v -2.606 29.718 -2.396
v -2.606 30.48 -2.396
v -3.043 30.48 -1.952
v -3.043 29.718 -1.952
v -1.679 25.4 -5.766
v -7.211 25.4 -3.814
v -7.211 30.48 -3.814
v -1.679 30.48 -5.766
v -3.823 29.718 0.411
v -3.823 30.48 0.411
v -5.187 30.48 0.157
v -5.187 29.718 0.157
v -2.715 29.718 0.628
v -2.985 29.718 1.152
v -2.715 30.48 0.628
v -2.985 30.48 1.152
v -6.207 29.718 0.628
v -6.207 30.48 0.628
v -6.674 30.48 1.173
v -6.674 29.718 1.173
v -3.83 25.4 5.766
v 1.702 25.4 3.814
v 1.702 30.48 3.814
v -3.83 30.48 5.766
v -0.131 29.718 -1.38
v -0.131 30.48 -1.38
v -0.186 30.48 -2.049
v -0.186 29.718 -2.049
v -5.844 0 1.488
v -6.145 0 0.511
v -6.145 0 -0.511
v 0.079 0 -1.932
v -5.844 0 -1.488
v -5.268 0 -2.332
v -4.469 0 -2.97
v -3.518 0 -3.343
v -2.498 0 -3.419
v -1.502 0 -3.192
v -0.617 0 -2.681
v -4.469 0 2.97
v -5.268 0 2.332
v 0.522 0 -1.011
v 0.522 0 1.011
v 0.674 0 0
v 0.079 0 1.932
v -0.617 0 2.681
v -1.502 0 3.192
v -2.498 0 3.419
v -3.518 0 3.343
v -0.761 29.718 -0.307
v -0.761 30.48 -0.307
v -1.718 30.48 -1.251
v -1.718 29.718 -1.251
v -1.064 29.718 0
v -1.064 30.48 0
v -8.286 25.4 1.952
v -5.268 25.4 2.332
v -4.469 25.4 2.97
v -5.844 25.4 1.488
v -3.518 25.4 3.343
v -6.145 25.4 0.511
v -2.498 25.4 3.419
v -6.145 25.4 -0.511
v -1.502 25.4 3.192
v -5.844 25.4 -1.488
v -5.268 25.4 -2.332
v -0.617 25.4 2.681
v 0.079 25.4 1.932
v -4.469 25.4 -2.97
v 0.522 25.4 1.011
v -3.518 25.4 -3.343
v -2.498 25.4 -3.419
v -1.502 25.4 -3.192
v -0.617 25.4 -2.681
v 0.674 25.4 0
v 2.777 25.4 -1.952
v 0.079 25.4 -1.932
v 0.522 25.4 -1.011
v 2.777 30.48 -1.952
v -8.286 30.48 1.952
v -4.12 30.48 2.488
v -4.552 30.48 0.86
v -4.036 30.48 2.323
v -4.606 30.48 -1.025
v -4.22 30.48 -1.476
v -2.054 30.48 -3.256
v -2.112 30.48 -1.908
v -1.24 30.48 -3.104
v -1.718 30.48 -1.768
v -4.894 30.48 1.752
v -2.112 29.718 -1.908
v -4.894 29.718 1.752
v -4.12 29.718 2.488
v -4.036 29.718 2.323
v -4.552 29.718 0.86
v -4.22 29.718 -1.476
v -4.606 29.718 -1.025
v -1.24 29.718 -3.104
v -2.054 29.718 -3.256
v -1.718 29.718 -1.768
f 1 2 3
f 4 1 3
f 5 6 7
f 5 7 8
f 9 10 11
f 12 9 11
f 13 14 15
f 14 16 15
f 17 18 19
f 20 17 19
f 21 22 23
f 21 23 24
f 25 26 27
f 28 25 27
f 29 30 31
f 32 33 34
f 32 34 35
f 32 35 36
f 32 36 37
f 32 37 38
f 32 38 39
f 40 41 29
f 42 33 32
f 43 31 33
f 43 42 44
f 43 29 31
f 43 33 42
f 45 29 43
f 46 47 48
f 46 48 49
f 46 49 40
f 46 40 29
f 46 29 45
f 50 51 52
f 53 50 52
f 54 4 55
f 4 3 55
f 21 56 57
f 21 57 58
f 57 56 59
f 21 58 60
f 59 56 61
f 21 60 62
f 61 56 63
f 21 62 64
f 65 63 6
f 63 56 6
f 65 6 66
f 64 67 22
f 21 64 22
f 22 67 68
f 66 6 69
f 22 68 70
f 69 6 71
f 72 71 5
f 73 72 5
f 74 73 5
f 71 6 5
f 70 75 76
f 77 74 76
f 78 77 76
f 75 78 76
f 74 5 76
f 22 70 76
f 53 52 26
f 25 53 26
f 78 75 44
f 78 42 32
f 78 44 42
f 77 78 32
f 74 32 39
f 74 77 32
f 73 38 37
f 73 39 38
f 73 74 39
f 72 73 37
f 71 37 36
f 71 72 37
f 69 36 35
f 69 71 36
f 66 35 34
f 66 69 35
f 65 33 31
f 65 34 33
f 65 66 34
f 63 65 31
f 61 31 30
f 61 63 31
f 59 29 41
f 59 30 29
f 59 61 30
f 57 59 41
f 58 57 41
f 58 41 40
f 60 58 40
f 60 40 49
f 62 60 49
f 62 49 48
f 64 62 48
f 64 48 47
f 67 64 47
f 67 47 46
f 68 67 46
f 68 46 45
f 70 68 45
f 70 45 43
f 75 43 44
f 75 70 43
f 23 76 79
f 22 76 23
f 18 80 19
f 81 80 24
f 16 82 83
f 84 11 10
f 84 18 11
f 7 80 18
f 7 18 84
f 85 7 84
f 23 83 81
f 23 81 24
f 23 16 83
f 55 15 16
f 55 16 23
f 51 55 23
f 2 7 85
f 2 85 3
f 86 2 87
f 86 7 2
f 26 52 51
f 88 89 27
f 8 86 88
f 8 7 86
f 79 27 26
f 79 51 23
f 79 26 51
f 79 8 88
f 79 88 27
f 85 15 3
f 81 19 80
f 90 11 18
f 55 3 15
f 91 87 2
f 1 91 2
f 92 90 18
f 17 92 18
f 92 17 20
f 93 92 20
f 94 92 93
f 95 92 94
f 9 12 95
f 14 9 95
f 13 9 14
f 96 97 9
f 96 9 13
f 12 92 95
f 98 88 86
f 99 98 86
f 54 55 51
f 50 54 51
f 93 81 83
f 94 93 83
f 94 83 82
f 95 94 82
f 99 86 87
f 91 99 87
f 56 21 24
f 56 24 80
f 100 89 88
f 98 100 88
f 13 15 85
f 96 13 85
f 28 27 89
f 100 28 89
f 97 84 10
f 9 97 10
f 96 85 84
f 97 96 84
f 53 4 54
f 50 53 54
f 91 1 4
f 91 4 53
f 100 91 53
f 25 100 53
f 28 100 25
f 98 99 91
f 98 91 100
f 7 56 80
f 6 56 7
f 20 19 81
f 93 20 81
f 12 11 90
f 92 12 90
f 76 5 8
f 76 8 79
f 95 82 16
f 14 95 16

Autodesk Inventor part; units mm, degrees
ref_plane "YZ Plane" through (0, 0, 0) normal (1, 0, 0) x (0, 1, 0)
ref_plane "XZ Plane" through (0, 0, 0) normal (0, 1, 0) x (-1, 0, 0)
ref_plane "XY Plane" through (0, 0, 0) normal (0, 0, 1) x (1, 0, 0)
sketch "Sketch1" plane through (0, 0, 0) normal (0, 0, 1) x (1, 0, 0)
  line L0 (-2.7545, 0) -> (0.6745, 0)
  line L1 (0.6745, 0) -> (0.6745, 25.4)
  line L2 (0.6745, 25.4) -> (-2.7545, 25.4)
  line L3 (-2.7545, 25.4) -> (-2.7545, 0)
  point P0 (0, 0)
  dimension "d0" = 3.429
  dimension "d1" = 25.4
revolve "Revolution1" add sketch "Sketch1" angle 360 about axis through (-2.7545, 25.4, 0) along (0, -1, 0)
sketch "Sketch2" plane through (-2.7545, 25.4, 0) normal (0, 1, 0) x (1, 0, 0)
  circle A0 centre (0, 0) radius 3.429 projected
  line L0 (-1.0753, -5.7665) -> (-5.5316, -1.952)
  line L1 (-5.5316, -1.952) -> (-4.4562, 3.8145)
  line L2 (-4.4562, 3.8145) -> (1.0753, 5.7665)
  line L3 (1.0753, 5.7665) -> (5.5316, 1.952)
  line L4 (5.5316, 1.952) -> (4.4562, -3.8145)
  line L5 (4.4562, -3.8145) -> (-1.0753, -5.7665)
  point P0 (2.7545, 0)
  dimension "d3" = 5.08
extrude "Extrusion1" add sketch "Sketch2" along normal blind 5.08 contours A0 | L0 L1 L2 L3 L4 L5
thread "Thread1" size "5/16-18 UNC" class "2A" standard "ANSI Unified Screw Threads" full length
sketch "Sketch3" plane through (-2.7545, 30.48, 0) normal (0, 1, 0) x (1, 0, 0)
  line L0 (5.5316, 1.952) -> (4.4562, -3.8145) projected
  line L1 (1.0753, 5.7665) -> (5.5316, 1.952) projected
  line L2 (-4.4562, 3.8145) -> (1.0753, 5.7665) projected
  line L3 (-3.9194, -1.1734) -> (-1.366, -2.4875)
  line L4 (-1.366, -2.4875) -> (-1.2813, -2.3228)
  line L5 (-1.2813, -2.3228) -> (-1.7974, -0.8601)
  line L6 (-1.7974, -0.8601) -> (-0.2306, -1.1523)
  line L7 (-0.2306, -1.1523) -> (0.0392, -0.6281)
  line L8 (0.0392, -0.6281) -> (-1.4654, 1.4765)
  line L9 (-1.4654, 1.4765) -> (-1.8516, 1.0253)
  line L10 (-1.8516, 1.0253) -> (-1.0682, -0.4113)
  line L11 (-1.0682, -0.4113) -> (-2.4324, -0.1569)
  line L12 (-2.4324, -0.1569) -> (-2.1392, -1.7523)
  line L13 (-2.1392, -1.7523) -> (-3.4526, -0.6281)
  line L14 (-3.4526, -0.6281) -> (-3.9194, -1.1734)
  line L15 (-0.2889, 1.952) -> (1.6905, 0)
  line L16 (1.6905, 0) -> (1.9932, 0.307)
  line L17 (1.9932, 0.307) -> (1.0361, 1.2509)
  line L18 (1.0361, 1.2509) -> (2.6233, 1.3796)
  line L19 (2.6233, 1.3796) -> (2.569, 2.0493)
  line L20 (2.569, 2.0493) -> (1.0361, 1.7676)
  line L21 (1.0361, 1.7676) -> (1.5146, 3.1041)
  line L22 (1.5146, 3.1041) -> (0.7008, 3.2559)
  line L23 (0.7008, 3.2559) -> (0.6427, 1.9085)
  line L24 (0.6427, 1.9085) -> (0.1487, 2.3957)
  line L25 (0.1487, 2.3957) -> (-0.2889, 1.952)
  point P0 (2.7545, 0)
extrude "Extrusion2" cut sketch "Sketch3" against normal blind 0.762
properties part number "1in bolt"
